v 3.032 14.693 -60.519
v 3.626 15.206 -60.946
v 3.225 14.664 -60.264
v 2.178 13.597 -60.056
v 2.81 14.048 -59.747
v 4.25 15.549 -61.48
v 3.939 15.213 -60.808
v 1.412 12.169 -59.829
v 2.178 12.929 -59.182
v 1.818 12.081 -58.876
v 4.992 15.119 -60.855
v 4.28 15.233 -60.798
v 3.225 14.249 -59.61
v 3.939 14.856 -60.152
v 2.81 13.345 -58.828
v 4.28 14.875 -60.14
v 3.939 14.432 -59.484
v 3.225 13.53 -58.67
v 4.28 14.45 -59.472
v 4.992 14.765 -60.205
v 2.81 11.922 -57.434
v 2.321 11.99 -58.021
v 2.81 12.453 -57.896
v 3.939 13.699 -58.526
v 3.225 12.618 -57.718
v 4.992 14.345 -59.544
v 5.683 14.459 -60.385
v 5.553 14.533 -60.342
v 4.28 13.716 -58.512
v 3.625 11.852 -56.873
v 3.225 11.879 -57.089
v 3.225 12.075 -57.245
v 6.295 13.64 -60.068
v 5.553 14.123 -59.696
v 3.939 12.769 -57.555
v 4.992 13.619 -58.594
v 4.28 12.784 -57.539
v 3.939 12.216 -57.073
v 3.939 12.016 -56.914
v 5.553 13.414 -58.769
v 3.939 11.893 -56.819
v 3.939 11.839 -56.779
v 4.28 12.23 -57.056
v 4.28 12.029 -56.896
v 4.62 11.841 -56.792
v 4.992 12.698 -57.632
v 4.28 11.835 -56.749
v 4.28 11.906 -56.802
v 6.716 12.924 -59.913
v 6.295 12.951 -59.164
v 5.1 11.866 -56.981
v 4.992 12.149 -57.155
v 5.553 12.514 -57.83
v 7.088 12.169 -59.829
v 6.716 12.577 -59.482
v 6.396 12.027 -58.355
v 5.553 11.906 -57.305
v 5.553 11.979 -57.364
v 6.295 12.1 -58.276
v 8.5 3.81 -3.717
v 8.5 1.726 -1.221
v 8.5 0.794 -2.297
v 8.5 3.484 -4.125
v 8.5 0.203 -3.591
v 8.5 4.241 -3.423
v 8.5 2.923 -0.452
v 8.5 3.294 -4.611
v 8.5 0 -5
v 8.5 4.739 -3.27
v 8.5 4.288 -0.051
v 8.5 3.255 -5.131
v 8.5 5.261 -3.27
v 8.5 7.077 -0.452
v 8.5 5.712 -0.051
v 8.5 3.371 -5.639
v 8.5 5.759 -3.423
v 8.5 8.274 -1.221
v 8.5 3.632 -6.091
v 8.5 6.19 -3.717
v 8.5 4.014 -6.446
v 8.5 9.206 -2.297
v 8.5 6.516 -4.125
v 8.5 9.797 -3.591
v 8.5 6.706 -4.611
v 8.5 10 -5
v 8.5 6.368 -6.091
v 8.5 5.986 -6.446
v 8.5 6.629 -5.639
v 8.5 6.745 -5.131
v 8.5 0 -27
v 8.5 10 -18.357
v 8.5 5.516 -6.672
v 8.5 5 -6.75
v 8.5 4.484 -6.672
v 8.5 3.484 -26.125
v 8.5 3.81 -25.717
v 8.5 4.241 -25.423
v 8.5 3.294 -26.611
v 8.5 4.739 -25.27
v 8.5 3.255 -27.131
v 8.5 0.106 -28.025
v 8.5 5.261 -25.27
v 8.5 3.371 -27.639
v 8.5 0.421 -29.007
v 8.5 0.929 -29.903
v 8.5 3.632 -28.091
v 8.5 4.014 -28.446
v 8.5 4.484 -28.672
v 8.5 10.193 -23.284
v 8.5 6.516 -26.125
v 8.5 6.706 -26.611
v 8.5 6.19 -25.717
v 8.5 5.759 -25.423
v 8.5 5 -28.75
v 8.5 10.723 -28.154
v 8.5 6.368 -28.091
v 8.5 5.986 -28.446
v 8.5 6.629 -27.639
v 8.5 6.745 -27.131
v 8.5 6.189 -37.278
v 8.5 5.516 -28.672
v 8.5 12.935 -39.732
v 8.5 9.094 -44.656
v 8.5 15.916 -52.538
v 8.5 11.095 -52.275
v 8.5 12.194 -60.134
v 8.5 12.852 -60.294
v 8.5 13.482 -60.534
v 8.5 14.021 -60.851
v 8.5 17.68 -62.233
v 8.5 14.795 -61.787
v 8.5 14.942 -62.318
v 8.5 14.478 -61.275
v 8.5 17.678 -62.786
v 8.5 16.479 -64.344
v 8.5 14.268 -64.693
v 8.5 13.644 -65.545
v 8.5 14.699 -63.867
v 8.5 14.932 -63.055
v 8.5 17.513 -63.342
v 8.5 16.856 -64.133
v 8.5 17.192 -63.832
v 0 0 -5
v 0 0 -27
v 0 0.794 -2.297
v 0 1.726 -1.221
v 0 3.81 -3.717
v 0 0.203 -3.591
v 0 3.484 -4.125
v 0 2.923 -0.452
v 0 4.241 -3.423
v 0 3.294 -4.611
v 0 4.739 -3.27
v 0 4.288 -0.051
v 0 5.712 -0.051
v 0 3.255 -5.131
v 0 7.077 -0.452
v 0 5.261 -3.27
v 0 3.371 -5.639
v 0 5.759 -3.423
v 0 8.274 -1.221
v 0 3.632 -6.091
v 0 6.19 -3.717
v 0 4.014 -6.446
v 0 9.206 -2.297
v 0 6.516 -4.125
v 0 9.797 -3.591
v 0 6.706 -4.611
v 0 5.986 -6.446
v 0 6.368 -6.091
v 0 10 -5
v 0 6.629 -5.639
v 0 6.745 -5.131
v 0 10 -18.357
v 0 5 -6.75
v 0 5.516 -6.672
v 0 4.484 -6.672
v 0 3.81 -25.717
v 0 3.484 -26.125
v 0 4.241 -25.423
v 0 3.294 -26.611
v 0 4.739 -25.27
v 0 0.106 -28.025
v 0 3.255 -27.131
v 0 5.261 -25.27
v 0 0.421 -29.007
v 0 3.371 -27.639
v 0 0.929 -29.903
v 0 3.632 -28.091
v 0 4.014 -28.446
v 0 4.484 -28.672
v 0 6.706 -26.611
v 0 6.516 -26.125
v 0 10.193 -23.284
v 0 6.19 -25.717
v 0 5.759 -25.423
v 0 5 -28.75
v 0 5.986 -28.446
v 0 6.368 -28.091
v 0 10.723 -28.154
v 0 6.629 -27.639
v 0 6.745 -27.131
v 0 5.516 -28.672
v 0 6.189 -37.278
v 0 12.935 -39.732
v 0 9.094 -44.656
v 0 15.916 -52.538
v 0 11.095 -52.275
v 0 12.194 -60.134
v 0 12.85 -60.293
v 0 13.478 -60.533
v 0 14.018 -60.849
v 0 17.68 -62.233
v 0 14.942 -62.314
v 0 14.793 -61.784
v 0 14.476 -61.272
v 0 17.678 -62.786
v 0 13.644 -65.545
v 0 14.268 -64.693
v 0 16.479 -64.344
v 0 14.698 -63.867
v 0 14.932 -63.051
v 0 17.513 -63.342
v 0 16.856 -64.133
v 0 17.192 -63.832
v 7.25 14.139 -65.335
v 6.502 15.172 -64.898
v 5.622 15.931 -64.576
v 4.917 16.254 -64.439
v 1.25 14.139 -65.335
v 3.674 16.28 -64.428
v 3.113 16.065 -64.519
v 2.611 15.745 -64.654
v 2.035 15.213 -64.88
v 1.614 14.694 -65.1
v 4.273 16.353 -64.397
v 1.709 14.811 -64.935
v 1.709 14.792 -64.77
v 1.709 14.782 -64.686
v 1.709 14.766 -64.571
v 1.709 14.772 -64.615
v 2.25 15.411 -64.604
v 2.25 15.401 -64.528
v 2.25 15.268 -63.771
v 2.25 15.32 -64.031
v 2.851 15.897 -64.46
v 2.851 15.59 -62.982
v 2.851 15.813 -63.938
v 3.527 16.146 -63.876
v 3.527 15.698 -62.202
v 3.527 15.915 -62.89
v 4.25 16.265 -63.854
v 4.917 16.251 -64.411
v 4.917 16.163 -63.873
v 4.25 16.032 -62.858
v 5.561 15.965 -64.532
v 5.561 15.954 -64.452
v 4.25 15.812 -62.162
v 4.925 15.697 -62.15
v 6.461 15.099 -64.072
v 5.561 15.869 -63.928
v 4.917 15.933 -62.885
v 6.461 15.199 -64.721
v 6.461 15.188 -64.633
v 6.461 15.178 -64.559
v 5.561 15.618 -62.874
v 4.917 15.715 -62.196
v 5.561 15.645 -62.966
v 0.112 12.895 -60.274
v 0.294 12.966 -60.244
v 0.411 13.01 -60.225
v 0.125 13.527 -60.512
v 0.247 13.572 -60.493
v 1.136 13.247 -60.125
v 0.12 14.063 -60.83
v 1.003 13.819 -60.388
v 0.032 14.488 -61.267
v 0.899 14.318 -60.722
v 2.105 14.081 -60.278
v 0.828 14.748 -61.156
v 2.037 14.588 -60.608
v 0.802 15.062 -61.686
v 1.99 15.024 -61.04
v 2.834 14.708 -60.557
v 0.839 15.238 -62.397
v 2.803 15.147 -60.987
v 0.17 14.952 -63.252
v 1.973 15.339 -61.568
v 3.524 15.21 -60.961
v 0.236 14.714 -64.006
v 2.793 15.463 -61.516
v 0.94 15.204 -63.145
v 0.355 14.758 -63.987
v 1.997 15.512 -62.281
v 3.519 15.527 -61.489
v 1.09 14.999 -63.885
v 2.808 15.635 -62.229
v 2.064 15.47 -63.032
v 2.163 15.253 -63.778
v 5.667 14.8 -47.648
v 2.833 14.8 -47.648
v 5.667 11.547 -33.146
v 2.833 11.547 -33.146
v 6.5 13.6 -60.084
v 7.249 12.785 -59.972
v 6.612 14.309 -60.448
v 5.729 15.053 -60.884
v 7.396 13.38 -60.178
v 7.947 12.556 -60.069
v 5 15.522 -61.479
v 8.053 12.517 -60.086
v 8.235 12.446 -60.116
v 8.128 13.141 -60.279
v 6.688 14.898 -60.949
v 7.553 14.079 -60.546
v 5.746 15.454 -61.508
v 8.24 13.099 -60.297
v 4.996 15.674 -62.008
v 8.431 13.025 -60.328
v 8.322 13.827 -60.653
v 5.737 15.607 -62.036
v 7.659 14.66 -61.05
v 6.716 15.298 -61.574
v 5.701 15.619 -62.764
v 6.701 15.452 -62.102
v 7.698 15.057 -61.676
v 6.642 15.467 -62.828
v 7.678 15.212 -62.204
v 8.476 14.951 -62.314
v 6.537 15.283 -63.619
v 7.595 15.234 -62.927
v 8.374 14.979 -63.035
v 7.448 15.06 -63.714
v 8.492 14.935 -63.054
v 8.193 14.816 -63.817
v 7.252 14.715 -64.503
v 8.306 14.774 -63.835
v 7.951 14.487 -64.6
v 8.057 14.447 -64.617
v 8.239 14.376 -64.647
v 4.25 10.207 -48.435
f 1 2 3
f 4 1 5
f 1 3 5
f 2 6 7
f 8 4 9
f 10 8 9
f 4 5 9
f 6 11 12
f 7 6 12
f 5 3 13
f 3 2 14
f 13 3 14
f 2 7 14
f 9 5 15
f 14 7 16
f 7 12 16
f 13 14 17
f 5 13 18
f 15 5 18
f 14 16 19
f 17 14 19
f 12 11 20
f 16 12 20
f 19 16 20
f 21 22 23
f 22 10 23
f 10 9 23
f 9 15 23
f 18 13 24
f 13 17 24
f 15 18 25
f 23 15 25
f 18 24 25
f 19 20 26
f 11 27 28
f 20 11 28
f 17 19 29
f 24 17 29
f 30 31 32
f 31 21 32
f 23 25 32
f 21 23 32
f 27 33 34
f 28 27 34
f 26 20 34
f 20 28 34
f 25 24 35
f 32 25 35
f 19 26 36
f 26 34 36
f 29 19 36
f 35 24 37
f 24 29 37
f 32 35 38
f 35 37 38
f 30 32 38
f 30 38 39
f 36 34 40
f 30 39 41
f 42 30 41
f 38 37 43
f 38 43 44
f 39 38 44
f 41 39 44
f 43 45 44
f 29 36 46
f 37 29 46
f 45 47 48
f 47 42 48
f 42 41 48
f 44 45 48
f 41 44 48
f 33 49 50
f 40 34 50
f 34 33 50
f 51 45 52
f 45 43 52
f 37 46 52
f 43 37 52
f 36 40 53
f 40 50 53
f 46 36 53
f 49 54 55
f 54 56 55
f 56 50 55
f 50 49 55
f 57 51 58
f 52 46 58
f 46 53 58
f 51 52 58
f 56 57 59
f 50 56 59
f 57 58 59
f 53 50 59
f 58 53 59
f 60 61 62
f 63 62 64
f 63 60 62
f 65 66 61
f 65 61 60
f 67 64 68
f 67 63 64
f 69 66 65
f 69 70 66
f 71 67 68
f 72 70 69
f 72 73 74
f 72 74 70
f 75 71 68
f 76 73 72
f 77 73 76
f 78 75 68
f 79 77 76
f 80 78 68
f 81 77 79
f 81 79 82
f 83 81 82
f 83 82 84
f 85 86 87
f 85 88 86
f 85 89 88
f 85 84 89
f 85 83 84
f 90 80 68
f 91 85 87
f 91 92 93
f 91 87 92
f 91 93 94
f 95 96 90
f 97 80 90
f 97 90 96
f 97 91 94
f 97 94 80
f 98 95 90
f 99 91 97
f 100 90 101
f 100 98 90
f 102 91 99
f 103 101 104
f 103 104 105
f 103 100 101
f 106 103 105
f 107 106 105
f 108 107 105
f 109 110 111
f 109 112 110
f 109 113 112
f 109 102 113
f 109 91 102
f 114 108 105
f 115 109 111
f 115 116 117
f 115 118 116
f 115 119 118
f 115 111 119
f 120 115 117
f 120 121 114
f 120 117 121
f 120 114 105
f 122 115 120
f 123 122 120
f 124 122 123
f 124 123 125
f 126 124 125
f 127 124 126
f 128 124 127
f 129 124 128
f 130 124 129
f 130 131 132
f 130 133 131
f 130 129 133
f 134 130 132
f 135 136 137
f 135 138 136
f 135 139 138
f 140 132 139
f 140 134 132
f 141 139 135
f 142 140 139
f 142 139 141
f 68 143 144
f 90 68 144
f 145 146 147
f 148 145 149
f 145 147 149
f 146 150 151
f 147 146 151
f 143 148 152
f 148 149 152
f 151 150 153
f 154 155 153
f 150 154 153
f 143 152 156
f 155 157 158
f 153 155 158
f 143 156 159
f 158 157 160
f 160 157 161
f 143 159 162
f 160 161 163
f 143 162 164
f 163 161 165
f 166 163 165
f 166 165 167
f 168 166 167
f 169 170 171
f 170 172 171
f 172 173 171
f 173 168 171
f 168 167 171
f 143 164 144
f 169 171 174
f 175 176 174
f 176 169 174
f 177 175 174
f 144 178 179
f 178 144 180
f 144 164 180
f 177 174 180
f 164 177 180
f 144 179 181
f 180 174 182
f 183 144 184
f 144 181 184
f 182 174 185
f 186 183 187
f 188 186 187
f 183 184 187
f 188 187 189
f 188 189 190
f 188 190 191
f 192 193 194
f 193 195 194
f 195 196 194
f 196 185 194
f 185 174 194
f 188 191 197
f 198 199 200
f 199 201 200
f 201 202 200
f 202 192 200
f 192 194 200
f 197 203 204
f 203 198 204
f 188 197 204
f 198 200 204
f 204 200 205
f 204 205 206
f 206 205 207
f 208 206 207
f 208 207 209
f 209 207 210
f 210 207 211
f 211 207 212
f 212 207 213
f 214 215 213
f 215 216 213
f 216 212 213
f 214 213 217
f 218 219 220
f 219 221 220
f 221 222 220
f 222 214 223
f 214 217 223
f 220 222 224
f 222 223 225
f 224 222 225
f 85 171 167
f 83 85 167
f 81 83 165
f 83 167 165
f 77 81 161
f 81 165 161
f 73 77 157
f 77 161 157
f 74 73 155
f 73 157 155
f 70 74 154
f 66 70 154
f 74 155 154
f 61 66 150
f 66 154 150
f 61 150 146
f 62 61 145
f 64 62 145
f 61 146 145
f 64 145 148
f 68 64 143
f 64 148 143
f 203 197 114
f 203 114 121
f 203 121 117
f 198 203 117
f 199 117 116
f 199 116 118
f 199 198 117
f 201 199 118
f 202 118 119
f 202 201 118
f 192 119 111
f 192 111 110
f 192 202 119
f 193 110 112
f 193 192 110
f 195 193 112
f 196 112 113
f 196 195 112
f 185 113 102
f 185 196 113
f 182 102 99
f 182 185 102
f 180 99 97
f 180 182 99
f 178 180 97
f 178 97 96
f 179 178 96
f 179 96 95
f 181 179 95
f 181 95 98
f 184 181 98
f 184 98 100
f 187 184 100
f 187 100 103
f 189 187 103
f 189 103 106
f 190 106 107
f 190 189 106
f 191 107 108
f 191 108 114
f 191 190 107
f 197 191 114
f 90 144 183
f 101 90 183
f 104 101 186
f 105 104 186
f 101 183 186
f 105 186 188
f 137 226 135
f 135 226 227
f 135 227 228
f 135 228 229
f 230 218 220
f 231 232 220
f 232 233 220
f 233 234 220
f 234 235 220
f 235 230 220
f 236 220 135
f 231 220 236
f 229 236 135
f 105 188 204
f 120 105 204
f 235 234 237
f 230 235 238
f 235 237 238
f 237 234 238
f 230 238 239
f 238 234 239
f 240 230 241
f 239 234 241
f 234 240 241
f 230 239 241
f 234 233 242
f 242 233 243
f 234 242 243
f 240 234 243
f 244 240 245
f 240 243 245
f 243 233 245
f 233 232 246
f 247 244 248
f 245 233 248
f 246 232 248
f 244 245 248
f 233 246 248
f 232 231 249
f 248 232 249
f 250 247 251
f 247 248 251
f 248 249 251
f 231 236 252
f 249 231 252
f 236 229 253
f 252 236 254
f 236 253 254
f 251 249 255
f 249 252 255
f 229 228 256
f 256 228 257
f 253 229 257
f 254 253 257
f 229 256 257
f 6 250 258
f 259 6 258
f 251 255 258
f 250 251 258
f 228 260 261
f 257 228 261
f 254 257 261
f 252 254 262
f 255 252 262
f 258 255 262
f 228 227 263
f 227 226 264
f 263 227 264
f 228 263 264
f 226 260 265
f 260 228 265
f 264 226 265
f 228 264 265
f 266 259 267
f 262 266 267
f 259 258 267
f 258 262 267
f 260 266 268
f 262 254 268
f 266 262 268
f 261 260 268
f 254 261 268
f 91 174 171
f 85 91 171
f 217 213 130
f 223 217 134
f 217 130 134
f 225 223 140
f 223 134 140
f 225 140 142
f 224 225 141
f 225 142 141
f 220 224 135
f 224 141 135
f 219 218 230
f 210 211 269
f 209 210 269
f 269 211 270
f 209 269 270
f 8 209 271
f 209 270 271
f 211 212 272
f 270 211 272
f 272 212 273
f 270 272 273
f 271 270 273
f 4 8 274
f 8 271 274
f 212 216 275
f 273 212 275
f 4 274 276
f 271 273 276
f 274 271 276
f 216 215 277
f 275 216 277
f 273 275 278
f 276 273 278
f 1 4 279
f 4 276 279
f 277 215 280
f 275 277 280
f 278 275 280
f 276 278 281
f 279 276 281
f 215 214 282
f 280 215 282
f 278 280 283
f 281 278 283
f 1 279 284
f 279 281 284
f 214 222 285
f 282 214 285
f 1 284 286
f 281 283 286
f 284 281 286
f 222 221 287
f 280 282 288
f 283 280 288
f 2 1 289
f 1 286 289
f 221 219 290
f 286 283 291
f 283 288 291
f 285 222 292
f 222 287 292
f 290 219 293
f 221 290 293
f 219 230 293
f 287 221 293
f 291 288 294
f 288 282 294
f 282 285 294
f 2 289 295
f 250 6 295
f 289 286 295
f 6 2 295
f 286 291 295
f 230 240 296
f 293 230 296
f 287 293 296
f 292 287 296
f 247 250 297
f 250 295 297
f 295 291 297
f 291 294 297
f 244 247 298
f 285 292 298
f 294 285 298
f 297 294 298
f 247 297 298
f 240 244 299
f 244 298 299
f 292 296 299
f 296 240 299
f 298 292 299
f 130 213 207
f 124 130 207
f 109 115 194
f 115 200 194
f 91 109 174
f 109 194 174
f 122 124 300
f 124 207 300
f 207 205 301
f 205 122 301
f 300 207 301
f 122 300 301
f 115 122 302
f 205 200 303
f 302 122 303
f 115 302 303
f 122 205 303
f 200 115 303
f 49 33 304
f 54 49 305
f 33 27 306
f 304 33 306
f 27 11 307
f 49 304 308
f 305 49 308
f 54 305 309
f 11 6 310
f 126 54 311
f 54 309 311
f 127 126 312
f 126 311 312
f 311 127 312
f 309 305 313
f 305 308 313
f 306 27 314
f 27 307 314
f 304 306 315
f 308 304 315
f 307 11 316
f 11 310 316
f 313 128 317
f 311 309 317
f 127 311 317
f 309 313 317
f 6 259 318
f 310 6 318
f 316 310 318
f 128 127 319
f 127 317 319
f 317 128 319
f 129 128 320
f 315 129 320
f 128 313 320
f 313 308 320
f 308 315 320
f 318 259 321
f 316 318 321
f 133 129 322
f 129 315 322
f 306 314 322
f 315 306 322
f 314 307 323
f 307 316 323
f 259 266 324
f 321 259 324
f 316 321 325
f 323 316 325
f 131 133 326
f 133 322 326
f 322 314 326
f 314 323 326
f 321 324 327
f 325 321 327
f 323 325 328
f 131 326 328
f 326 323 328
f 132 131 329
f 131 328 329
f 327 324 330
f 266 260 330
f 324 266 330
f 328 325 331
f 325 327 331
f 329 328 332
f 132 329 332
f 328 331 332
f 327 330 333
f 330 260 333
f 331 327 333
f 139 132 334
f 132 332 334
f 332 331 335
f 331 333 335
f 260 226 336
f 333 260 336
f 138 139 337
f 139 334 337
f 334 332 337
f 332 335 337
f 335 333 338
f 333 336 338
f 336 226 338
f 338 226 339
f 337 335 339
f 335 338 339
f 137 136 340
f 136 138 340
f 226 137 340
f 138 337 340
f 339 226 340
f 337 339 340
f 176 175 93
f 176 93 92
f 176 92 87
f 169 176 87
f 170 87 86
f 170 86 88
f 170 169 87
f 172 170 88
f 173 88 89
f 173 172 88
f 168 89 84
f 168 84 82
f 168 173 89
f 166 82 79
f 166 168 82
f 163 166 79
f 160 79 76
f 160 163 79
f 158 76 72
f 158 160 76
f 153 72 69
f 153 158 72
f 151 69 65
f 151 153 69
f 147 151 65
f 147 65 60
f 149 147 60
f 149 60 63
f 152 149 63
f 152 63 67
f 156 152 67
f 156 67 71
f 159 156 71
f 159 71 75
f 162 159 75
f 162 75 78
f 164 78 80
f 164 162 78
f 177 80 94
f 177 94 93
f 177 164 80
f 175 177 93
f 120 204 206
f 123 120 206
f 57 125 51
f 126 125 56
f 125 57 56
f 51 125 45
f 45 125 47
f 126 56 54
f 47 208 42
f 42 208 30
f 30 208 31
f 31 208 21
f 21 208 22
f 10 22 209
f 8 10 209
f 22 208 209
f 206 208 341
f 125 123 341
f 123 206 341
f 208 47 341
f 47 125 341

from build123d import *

# Parameters (mm, degrees)
SKETCH1_R           = 1.7499999999999998
SKETCH1_R_2         = 1.7500000000000002
BOSS_EXTRUDE1_DEPTH = 8.5
BOSS_EXTRUDE2_START = -8.5
BOSS_EXTRUDE2_DEPTH = 8.5
FILLET1_R           = 2


with BuildPart() as part:
    # Sketch1 → Boss-Extrude1 (new body)
    with BuildSketch(Plane(origin=(0, 0, 0), x_dir=(0, 0, -1), z_dir=(1, 0, 0))):
        with BuildLine():
            Line((27, 10), (4.999999999999845, 10))
            ThreePointArc((4.999999999999845, 9.999999999999996), (2.66e-15, 4.999999999999989), (4.999999999999866, 2.66e-15))
            Line((4.999999999999866, 0), (27, 0))
            ThreePointArc((27, -8.9e-16), (32, 5), (27, 10))
        make_face()
        with Locations((5, 5)):
            Circle(SKETCH1_R, mode=Mode.SUBTRACT)
        with Locations((27, 5)):
            Circle(SKETCH1_R_2, mode=Mode.SUBTRACT)
    extrude(amount=BOSS_EXTRUDE1_DEPTH)

    # Sketch2 → Boss-Extrude2 (add)
    with BuildSketch(Plane(origin=(8.5, 0, 0), x_dir=(0, 0, -1), z_dir=(1, 0, 0)).offset(BOSS_EXTRUDE2_START)):
        with BuildLine():
            add(Edge.make_bspline(
                [(63.753003749139694, 17.8724364513696), (48.4484123726985, 16.075931173157382), (33.927648133343, 10.00000000000011), (18.35740593050513, 10)],
                knots=[0, 0, 0, 0, 1, 1, 1, 1], degree=3))
            Line((18.35740593050513, 10), (27, 10.000000000000002))
            ThreePointArc((27, 10.000000000000004), (31.76198872224619, 6.524291116945876), (29.90346284332652, 0.9293853636800407))
            Line((29.903462843326523, 0.9293853636800362), (37.27788733358429, 6.189369275529155))
            add(Edge.make_bspline(
                [(37.27788733358429, 6.189369275529155), (48.425576395597574, 11.344056029156562), (60.710162222104955, 12.2385110488325)],
                knots=[0, 0, 0, 1, 1, 1], degree=2))
            Line((60.710162222104955, 12.238511048832498), (65.58908690842728, 13.539967250903384))
            Line((65.58908690842728, 13.539967250903384), (63.753003749139694, 17.8724364513696))
        make_face()
    extrude(amount=BOSS_EXTRUDE2_DEPTH)

    # Sketch3 → Cut-Revolve1 (revolve, cut)
    with BuildSketch(Plane.ZY.offset(-4.25)):
        with BuildLine():
            Line((-61.363286830934264, 3.0092373204057665), (-70.57054843387056, 6.911330832239489))
            add(Edge.make_bspline(
                [(-61.363286830934264, 3.0092373204057665), (-56.87587929232551, 13.597588163782518), (-61.47951009379365, 15.548634919699378), (-66.08314089526179, 17.499681675616234), (-70.57054843387056, 6.911330832239489)],
                knots=[1.5707963267948968, 1.5707963267948968, 1.5707963267948968, 3.141592653589793, 3.141592653589793, 4.71238898038469, 4.71238898038469, 4.71238898038469], degree=2, weights=[1, 0.7071067811865477, 1, 0.7071067811865477, 1]))
        make_face()
    revolve(axis=Axis((4.25, 3.0092373204057665, -61.363286830934264), (0, 0.3902093511833724, -0.9207261602936302)), mode=Mode.SUBTRACT)

    # Fillet1
    fillet1_edges = [part.edges().sort_by_distance(p)[0] for p in [
        (4.25, 17.8724364513696, -63.753003749139694),
    ]]
    fillet(fillet1_edges, radius=FILLET1_R)

    # Sketch4 → Cut-Revolve4 (revolve, cut)
    with BuildSketch(Plane(origin=(0, 24.455596913653128, -57.70468538416743), x_dir=(0, -0.9207261602936302, -0.39020935118337224), z_dir=(0, 0.39020935118337224, -0.9207261602936302))):
        with BuildLine():
            Line((21.173844817348538, 0.7500000000000007), (21.173844817348538, -9.250000000000004))
            add(Edge.make_bspline(
                [(21.173844817348538, 0.7500000000000007), (9.67384481734854, 0.7500000000000027), (9.673844817348536, -4.249999999999997), (9.673844817348535, -9.249999999999996), (21.173844817348538, -9.250000000000004)],
                knots=[4.71238898038469, 4.71238898038469, 4.71238898038469, 6.283185307179586, 6.283185307179586, 7.853981633974483, 7.853981633974483, 7.853981633974483], degree=2, weights=[1, 0.7071067811865476, 1, 0.7071067811865476, 1]))
        make_face()
    revolve(axis=Axis((-0.7500000000000007, 4.960284076322628, -65.96691763240241), (1, 0, 0)), mode=Mode.SUBTRACT)


solid = part.part
